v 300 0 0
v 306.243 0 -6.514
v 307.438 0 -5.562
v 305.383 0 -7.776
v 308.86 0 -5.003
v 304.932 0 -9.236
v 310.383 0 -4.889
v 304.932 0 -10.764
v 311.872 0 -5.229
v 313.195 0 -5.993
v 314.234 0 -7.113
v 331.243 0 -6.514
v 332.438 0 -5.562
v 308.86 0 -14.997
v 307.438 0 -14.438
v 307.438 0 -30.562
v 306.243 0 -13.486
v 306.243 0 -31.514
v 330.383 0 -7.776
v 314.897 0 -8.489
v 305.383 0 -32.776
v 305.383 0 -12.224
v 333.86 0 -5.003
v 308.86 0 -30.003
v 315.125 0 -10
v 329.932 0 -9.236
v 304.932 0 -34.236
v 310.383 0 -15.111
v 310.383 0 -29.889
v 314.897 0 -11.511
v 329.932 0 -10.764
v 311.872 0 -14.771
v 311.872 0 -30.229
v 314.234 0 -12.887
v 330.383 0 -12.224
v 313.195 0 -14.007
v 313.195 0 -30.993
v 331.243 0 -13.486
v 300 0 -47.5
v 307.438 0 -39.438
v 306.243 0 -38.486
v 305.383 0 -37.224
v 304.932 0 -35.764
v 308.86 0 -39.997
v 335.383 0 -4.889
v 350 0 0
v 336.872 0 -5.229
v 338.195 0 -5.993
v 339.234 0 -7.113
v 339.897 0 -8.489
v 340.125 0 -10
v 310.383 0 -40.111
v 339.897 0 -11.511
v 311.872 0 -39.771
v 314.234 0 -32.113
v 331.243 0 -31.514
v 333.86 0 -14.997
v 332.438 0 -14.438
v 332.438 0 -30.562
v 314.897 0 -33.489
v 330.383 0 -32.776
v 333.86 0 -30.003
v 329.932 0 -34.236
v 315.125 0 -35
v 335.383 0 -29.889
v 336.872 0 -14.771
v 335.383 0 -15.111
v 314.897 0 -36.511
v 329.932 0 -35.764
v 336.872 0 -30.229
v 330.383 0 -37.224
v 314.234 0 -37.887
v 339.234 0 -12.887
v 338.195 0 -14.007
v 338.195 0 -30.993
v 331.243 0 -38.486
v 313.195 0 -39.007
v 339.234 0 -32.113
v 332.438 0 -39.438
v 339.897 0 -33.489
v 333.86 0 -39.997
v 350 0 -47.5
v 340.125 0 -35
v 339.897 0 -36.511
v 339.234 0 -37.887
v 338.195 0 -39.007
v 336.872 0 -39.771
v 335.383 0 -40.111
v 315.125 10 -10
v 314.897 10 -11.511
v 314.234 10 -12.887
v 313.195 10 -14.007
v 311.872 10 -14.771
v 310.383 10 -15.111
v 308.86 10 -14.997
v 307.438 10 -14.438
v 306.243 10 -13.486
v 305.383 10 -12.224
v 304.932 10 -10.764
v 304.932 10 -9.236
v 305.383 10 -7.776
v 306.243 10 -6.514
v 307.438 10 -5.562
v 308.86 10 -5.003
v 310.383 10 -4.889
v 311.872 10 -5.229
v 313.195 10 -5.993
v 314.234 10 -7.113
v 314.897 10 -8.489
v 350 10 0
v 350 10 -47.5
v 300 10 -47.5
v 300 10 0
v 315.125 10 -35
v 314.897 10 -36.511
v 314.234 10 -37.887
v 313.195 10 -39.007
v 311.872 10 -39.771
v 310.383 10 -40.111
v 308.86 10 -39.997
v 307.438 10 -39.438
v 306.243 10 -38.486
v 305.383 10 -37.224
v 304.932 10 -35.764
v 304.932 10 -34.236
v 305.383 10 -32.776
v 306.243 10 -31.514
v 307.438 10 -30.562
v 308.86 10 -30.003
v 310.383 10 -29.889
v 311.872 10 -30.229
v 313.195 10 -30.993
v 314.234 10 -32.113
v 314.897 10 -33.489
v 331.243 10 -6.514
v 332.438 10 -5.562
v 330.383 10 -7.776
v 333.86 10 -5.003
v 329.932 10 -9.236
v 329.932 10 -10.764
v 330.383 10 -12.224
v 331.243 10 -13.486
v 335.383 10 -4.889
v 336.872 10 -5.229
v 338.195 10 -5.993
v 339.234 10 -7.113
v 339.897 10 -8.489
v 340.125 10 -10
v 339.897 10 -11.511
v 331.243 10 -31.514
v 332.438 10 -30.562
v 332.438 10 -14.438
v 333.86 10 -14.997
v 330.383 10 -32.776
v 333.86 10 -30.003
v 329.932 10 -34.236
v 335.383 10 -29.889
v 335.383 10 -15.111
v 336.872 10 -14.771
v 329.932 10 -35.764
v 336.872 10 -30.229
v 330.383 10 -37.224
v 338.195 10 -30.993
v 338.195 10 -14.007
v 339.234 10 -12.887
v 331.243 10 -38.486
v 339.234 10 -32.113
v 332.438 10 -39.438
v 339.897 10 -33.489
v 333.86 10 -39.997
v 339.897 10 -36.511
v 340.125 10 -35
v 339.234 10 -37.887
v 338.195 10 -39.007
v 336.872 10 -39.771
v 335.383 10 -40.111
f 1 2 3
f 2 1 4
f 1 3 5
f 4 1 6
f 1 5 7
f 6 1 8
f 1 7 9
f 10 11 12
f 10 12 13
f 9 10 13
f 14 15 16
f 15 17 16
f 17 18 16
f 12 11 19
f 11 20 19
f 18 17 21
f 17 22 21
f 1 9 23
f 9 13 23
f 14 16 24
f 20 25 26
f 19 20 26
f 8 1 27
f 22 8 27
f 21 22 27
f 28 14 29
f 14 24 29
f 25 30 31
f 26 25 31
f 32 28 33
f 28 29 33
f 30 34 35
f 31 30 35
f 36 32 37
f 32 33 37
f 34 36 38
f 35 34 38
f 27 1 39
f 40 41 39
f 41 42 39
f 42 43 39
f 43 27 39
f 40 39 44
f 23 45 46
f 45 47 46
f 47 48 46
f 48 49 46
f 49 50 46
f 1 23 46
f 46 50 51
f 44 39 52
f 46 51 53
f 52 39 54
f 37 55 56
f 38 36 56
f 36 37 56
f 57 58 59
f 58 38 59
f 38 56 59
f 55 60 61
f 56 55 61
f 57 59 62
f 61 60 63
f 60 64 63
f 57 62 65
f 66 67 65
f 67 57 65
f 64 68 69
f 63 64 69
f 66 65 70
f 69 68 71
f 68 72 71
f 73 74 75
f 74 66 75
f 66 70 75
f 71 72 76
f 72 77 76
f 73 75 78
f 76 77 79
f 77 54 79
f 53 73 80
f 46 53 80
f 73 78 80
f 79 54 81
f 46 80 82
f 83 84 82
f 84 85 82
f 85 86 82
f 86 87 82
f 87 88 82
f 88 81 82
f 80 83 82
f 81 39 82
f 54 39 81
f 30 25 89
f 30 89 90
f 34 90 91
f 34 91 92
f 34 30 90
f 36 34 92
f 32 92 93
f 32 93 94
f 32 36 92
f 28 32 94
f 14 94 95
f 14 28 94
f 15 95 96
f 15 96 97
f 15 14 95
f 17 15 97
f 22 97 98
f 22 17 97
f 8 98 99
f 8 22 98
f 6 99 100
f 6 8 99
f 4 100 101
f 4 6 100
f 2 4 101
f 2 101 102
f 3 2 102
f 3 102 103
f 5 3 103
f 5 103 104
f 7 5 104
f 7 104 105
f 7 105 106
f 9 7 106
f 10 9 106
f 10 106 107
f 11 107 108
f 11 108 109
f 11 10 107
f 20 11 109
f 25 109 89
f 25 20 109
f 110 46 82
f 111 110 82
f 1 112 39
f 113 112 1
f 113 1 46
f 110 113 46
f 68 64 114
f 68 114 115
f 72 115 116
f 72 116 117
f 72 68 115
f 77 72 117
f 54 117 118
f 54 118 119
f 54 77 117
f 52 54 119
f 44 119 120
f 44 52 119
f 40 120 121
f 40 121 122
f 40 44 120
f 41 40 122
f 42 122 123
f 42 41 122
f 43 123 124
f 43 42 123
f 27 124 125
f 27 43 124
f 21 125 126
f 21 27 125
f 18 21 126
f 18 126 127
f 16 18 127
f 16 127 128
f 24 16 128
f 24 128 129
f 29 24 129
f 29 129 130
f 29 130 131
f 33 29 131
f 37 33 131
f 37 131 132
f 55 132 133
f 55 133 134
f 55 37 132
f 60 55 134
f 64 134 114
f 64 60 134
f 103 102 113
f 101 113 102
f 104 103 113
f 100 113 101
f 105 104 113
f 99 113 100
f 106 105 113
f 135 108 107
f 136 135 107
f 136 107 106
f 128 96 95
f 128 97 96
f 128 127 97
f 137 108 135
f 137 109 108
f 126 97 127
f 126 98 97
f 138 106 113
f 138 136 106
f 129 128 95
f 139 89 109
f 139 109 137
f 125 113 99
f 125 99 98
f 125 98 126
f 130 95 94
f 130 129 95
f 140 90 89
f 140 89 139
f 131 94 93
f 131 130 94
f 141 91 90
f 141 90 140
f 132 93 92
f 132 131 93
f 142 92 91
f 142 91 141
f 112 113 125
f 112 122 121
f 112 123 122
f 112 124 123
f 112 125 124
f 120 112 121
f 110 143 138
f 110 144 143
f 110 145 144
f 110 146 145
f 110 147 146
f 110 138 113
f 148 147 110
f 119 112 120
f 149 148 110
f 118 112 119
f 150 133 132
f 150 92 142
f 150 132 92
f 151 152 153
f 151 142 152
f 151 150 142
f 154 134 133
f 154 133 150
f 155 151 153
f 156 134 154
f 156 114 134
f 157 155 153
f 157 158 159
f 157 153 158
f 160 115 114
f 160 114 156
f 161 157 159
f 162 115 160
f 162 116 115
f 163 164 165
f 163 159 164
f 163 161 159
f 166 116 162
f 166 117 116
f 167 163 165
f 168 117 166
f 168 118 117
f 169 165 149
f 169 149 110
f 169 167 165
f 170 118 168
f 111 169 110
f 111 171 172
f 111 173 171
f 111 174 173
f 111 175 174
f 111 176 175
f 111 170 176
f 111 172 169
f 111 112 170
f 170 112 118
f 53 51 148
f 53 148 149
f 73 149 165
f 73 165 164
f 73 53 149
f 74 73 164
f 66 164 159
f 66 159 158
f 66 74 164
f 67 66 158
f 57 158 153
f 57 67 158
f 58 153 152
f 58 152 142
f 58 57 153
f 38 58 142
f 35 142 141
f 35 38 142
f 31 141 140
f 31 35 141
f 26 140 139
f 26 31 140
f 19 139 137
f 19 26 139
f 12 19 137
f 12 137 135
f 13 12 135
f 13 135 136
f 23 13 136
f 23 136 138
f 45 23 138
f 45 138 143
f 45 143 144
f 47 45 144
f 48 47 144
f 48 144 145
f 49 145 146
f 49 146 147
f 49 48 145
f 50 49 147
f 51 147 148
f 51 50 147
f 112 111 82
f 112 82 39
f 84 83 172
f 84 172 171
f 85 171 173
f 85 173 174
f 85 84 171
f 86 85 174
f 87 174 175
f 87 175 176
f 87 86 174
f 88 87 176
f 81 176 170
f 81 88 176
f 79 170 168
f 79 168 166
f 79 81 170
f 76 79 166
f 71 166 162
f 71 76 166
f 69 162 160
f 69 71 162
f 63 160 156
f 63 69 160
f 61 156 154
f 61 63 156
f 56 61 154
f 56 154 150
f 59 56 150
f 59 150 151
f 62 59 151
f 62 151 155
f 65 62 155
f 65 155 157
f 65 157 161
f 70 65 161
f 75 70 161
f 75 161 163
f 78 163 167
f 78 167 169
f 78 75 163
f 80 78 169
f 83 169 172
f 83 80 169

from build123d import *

# Parameters (mm, degrees)
SKETCH2_W               = 350
SKETCH2_H               = 350
BOSS_EXTRUDE2_DEPTH     = 10
ADVANCEDHOLE1_OUTLINE_R = 5.125
ADVANCEDHOLE1_DEPTH     = 10
CUT_EXTRUDE4_DEPTH      = 50
CUT_EXTRUDE5_DEPTH      = 50


# Read off the part's stored shape, not the designer's step: AdvancedHole1
with BuildPart() as part:
    # Sketch2 → Boss-Extrude2 (new body)
    with BuildSketch(Plane(origin=(0, 0, 0), x_dir=(1, 0, 0), z_dir=(0, 1, 0))):
        with Locations((175, 175)):
            Rectangle(SKETCH2_W, SKETCH2_H)
    extrude(amount=BOSS_EXTRUDE2_DEPTH)

    # AdvancedHole1 outline → AdvancedHole1 (cut)
    with BuildSketch(Plane(origin=(0, 0, 0), x_dir=(1, 0, 0), z_dir=(0, 1, 0))):
        with Locations((10, 310)):
            Circle(ADVANCEDHOLE1_OUTLINE_R)
        with Locations((10, 335)):
            Circle(ADVANCEDHOLE1_OUTLINE_R)
        with Locations((35, 335)):
            Circle(ADVANCEDHOLE1_OUTLINE_R)
        with Locations((35, 310)):
            Circle(ADVANCEDHOLE1_OUTLINE_R)
        with Locations((60, 335)):
            Circle(ADVANCEDHOLE1_OUTLINE_R)
        with Locations((85, 335)):
            Circle(ADVANCEDHOLE1_OUTLINE_R)
        with Locations((60, 310)):
            Circle(ADVANCEDHOLE1_OUTLINE_R)
        with Locations((85, 310)):
            Circle(ADVANCEDHOLE1_OUTLINE_R)
        with Locations((10, 285)):
            Circle(ADVANCEDHOLE1_OUTLINE_R)
        with Locations((35, 285)):
            Circle(ADVANCEDHOLE1_OUTLINE_R)
        with Locations((60, 285)):
            Circle(ADVANCEDHOLE1_OUTLINE_R)
        with Locations((85, 285)):
            Circle(ADVANCEDHOLE1_OUTLINE_R)
        with Locations((10, 260)):
            Circle(ADVANCEDHOLE1_OUTLINE_R)
        with Locations((35, 260)):
            Circle(ADVANCEDHOLE1_OUTLINE_R)
        with Locations((60, 260)):
            Circle(ADVANCEDHOLE1_OUTLINE_R)
        with Locations((85, 260)):
            Circle(ADVANCEDHOLE1_OUTLINE_R)
        with Locations((110, 285)):
            Circle(ADVANCEDHOLE1_OUTLINE_R)
        with Locations((110, 310)):
            Circle(ADVANCEDHOLE1_OUTLINE_R)
        with Locations((110, 335)):
            Circle(ADVANCEDHOLE1_OUTLINE_R)
        with Locations((135, 285)):
            Circle(ADVANCEDHOLE1_OUTLINE_R)
        with Locations((135, 310)):
            Circle(ADVANCEDHOLE1_OUTLINE_R)
        with Locations((135, 335)):
            Circle(ADVANCEDHOLE1_OUTLINE_R)
        with Locations((160, 335)):
            Circle(ADVANCEDHOLE1_OUTLINE_R)
        with Locations((160, 310)):
            Circle(ADVANCEDHOLE1_OUTLINE_R)
        with Locations((110, 260)):
            Circle(ADVANCEDHOLE1_OUTLINE_R)
        with Locations((135, 260)):
            Circle(ADVANCEDHOLE1_OUTLINE_R)
        with Locations((160, 285)):
            Circle(ADVANCEDHOLE1_OUTLINE_R)
        with Locations((160, 260)):
            Circle(ADVANCEDHOLE1_OUTLINE_R)
        with Locations((185, 335)):
            Circle(ADVANCEDHOLE1_OUTLINE_R)
        with Locations((185, 310)):
            Circle(ADVANCEDHOLE1_OUTLINE_R)
        with Locations((185, 285)):
            Circle(ADVANCEDHOLE1_OUTLINE_R)
        with Locations((185, 260)):
            Circle(ADVANCEDHOLE1_OUTLINE_R)
        with Locations((210, 310)):
            Circle(ADVANCEDHOLE1_OUTLINE_R)
        with Locations((210, 335)):
            Circle(ADVANCEDHOLE1_OUTLINE_R)
        with Locations((235, 310)):
            Circle(ADVANCEDHOLE1_OUTLINE_R)
        with Locations((235, 335)):
            Circle(ADVANCEDHOLE1_OUTLINE_R)
        with Locations((260, 310)):
            Circle(ADVANCEDHOLE1_OUTLINE_R)
        with Locations((285, 310)):
            Circle(ADVANCEDHOLE1_OUTLINE_R)
        with Locations((260, 335)):
            Circle(ADVANCEDHOLE1_OUTLINE_R)
        with Locations((285, 335)):
            Circle(ADVANCEDHOLE1_OUTLINE_R)
        with Locations((310, 335)):
            Circle(ADVANCEDHOLE1_OUTLINE_R)
        with Locations((335, 335)):
            Circle(ADVANCEDHOLE1_OUTLINE_R)
        with Locations((310, 310)):
            Circle(ADVANCEDHOLE1_OUTLINE_R)
        with Locations((335, 310)):
            Circle(ADVANCEDHOLE1_OUTLINE_R)
        with Locations((210, 285)):
            Circle(ADVANCEDHOLE1_OUTLINE_R)
        with Locations((235, 285)):
            Circle(ADVANCEDHOLE1_OUTLINE_R)
        with Locations((260, 285)):
            Circle(ADVANCEDHOLE1_OUTLINE_R)
        with Locations((285, 285)):
            Circle(ADVANCEDHOLE1_OUTLINE_R)
        with Locations((310, 285)):
            Circle(ADVANCEDHOLE1_OUTLINE_R)
        with Locations((335, 285)):
            Circle(ADVANCEDHOLE1_OUTLINE_R)
        with Locations((210, 260)):
            Circle(ADVANCEDHOLE1_OUTLINE_R)
        with Locations((235, 260)):
            Circle(ADVANCEDHOLE1_OUTLINE_R)
        with Locations((260, 260)):
            Circle(ADVANCEDHOLE1_OUTLINE_R)
        with Locations((285, 260)):
            Circle(ADVANCEDHOLE1_OUTLINE_R)
        with Locations((310, 260)):
            Circle(ADVANCEDHOLE1_OUTLINE_R)
        with Locations((335, 260)):
            Circle(ADVANCEDHOLE1_OUTLINE_R)
        with Locations((10, 235)):
            Circle(ADVANCEDHOLE1_OUTLINE_R)
        with Locations((35, 235)):
            Circle(ADVANCEDHOLE1_OUTLINE_R)
        with Locations((60, 235)):
            Circle(ADVANCEDHOLE1_OUTLINE_R)
        with Locations((85, 235)):
            Circle(ADVANCEDHOLE1_OUTLINE_R)
        with Locations((110, 235)):
            Circle(ADVANCEDHOLE1_OUTLINE_R)
        with Locations((135, 235)):
            Circle(ADVANCEDHOLE1_OUTLINE_R)
        with Locations((160, 235)):
            Circle(ADVANCEDHOLE1_OUTLINE_R)
        with Locations((185, 235)):
            Circle(ADVANCEDHOLE1_OUTLINE_R)
        with Locations((210, 235)):
            Circle(ADVANCEDHOLE1_OUTLINE_R)
        with Locations((235, 235)):
            Circle(ADVANCEDHOLE1_OUTLINE_R)
        with Locations((260, 235)):
            Circle(ADVANCEDHOLE1_OUTLINE_R)
        with Locations((285, 235)):
            Circle(ADVANCEDHOLE1_OUTLINE_R)
        with Locations((310, 235)):
            Circle(ADVANCEDHOLE1_OUTLINE_R)
        with Locations((335, 235)):
            Circle(ADVANCEDHOLE1_OUTLINE_R)
        with Locations((10, 210)):
            Circle(ADVANCEDHOLE1_OUTLINE_R)
        with Locations((35, 210)):
            Circle(ADVANCEDHOLE1_OUTLINE_R)
        with Locations((60, 210)):
            Circle(ADVANCEDHOLE1_OUTLINE_R)
        with Locations((85, 210)):
            Circle(ADVANCEDHOLE1_OUTLINE_R)
        with Locations((110, 210)):
            Circle(ADVANCEDHOLE1_OUTLINE_R)
        with Locations((135, 210)):
            Circle(ADVANCEDHOLE1_OUTLINE_R)
        with Locations((160, 210)):
            Circle(ADVANCEDHOLE1_OUTLINE_R)
        with Locations((185, 210)):
            Circle(ADVANCEDHOLE1_OUTLINE_R)
        with Locations((210, 210)):
            Circle(ADVANCEDHOLE1_OUTLINE_R)
        with Locations((235, 210)):
            Circle(ADVANCEDHOLE1_OUTLINE_R)
        with Locations((260, 210)):
            Circle(ADVANCEDHOLE1_OUTLINE_R)
        with Locations((285, 210)):
            Circle(ADVANCEDHOLE1_OUTLINE_R)
        with Locations((310, 210)):
            Circle(ADVANCEDHOLE1_OUTLINE_R)
        with Locations((335, 210)):
            Circle(ADVANCEDHOLE1_OUTLINE_R)
        with Locations((10, 185)):
            Circle(ADVANCEDHOLE1_OUTLINE_R)
        with Locations((35, 185)):
            Circle(ADVANCEDHOLE1_OUTLINE_R)
        with Locations((60, 185)):
            Circle(ADVANCEDHOLE1_OUTLINE_R)
        with Locations((85, 185)):
            Circle(ADVANCEDHOLE1_OUTLINE_R)
        with Locations((110, 185)):
            Circle(ADVANCEDHOLE1_OUTLINE_R)
        with Locations((135, 185)):
            Circle(ADVANCEDHOLE1_OUTLINE_R)
        with Locations((160, 185)):
            Circle(ADVANCEDHOLE1_OUTLINE_R)
        with Locations((185, 185)):
            Circle(ADVANCEDHOLE1_OUTLINE_R)
        with Locations((210, 185)):
            Circle(ADVANCEDHOLE1_OUTLINE_R)
        with Locations((235, 185)):
            Circle(ADVANCEDHOLE1_OUTLINE_R)
        with Locations((260, 185)):
            Circle(ADVANCEDHOLE1_OUTLINE_R)
        with Locations((285, 185)):
            Circle(ADVANCEDHOLE1_OUTLINE_R)
        with Locations((310, 185)):
            Circle(ADVANCEDHOLE1_OUTLINE_R)
        with Locations((335, 185)):
            Circle(ADVANCEDHOLE1_OUTLINE_R)
        with Locations((10, 160)):
            Circle(ADVANCEDHOLE1_OUTLINE_R)
        with Locations((35, 160)):
            Circle(ADVANCEDHOLE1_OUTLINE_R)
        with Locations((60, 160)):
            Circle(ADVANCEDHOLE1_OUTLINE_R)
        with Locations((85, 160)):
            Circle(ADVANCEDHOLE1_OUTLINE_R)
        with Locations((110, 160)):
            Circle(ADVANCEDHOLE1_OUTLINE_R)
        with Locations((135, 160)):
            Circle(ADVANCEDHOLE1_OUTLINE_R)
        with Locations((160, 160)):
            Circle(ADVANCEDHOLE1_OUTLINE_R)
        with Locations((185, 160)):
            Circle(ADVANCEDHOLE1_OUTLINE_R)
        with Locations((210, 160)):
            Circle(ADVANCEDHOLE1_OUTLINE_R)
        with Locations((235, 160)):
            Circle(ADVANCEDHOLE1_OUTLINE_R)
        with Locations((260, 160)):
            Circle(ADVANCEDHOLE1_OUTLINE_R)
        with Locations((285, 160)):
            Circle(ADVANCEDHOLE1_OUTLINE_R)
        with Locations((310, 160)):
            Circle(ADVANCEDHOLE1_OUTLINE_R)
        with Locations((335, 160)):
            Circle(ADVANCEDHOLE1_OUTLINE_R)
        with Locations((10, 135)):
            Circle(ADVANCEDHOLE1_OUTLINE_R)
        with Locations((35, 135)):
            Circle(ADVANCEDHOLE1_OUTLINE_R)
        with Locations((60, 135)):
            Circle(ADVANCEDHOLE1_OUTLINE_R)
        with Locations((85, 135)):
            Circle(ADVANCEDHOLE1_OUTLINE_R)
        with Locations((110, 135)):
            Circle(ADVANCEDHOLE1_OUTLINE_R)
        with Locations((135, 135)):
            Circle(ADVANCEDHOLE1_OUTLINE_R)
        with Locations((160, 135)):
            Circle(ADVANCEDHOLE1_OUTLINE_R)
        with Locations((185, 135)):
            Circle(ADVANCEDHOLE1_OUTLINE_R)
        with Locations((210, 135)):
            Circle(ADVANCEDHOLE1_OUTLINE_R)
        with Locations((235, 135)):
            Circle(ADVANCEDHOLE1_OUTLINE_R)
        with Locations((260, 135)):
            Circle(ADVANCEDHOLE1_OUTLINE_R)
        with Locations((285, 135)):
            Circle(ADVANCEDHOLE1_OUTLINE_R)
        with Locations((310, 135)):
            Circle(ADVANCEDHOLE1_OUTLINE_R)
        with Locations((335, 135)):
            Circle(ADVANCEDHOLE1_OUTLINE_R)
        with Locations((10, 110)):
            Circle(ADVANCEDHOLE1_OUTLINE_R)
        with Locations((35, 110)):
            Circle(ADVANCEDHOLE1_OUTLINE_R)
        with Locations((60, 110)):
            Circle(ADVANCEDHOLE1_OUTLINE_R)
        with Locations((85, 110)):
            Circle(ADVANCEDHOLE1_OUTLINE_R)
        with Locations((110, 110)):
            Circle(ADVANCEDHOLE1_OUTLINE_R)
        with Locations((135, 110)):
            Circle(ADVANCEDHOLE1_OUTLINE_R)
        with Locations((160, 110)):
            Circle(ADVANCEDHOLE1_OUTLINE_R)
        with Locations((185, 110)):
            Circle(ADVANCEDHOLE1_OUTLINE_R)
        with Locations((210, 110)):
            Circle(ADVANCEDHOLE1_OUTLINE_R)
        with Locations((235, 110)):
            Circle(ADVANCEDHOLE1_OUTLINE_R)
        with Locations((260, 110)):
            Circle(ADVANCEDHOLE1_OUTLINE_R)
        with Locations((285, 110)):
            Circle(ADVANCEDHOLE1_OUTLINE_R)
        with Locations((310, 110)):
            Circle(ADVANCEDHOLE1_OUTLINE_R)
        with Locations((335, 110)):
            Circle(ADVANCEDHOLE1_OUTLINE_R)
        with Locations((10, 85)):
            Circle(ADVANCEDHOLE1_OUTLINE_R)
        with Locations((35, 85)):
            Circle(ADVANCEDHOLE1_OUTLINE_R)
        with Locations((60, 85)):
            Circle(ADVANCEDHOLE1_OUTLINE_R)
        with Locations((85, 85)):
            Circle(ADVANCEDHOLE1_OUTLINE_R)
        with Locations((110, 85)):
            Circle(ADVANCEDHOLE1_OUTLINE_R)
        with Locations((135, 85)):
            Circle(ADVANCEDHOLE1_OUTLINE_R)
        with Locations((160, 85)):
            Circle(ADVANCEDHOLE1_OUTLINE_R)
        with Locations((185, 85)):
            Circle(ADVANCEDHOLE1_OUTLINE_R)
        with Locations((210, 85)):
            Circle(ADVANCEDHOLE1_OUTLINE_R)
        with Locations((235, 85)):
            Circle(ADVANCEDHOLE1_OUTLINE_R)
        with Locations((260, 85)):
            Circle(ADVANCEDHOLE1_OUTLINE_R)
        with Locations((285, 85)):
            Circle(ADVANCEDHOLE1_OUTLINE_R)
        with Locations((310, 85)):
            Circle(ADVANCEDHOLE1_OUTLINE_R)
        with Locations((335, 85)):
            Circle(ADVANCEDHOLE1_OUTLINE_R)
        with Locations((335, 60)):
            Circle(ADVANCEDHOLE1_OUTLINE_R)
        with Locations((310, 60)):
            Circle(ADVANCEDHOLE1_OUTLINE_R)
        with Locations((285, 60)):
            Circle(ADVANCEDHOLE1_OUTLINE_R)
        with Locations((260, 60)):
            Circle(ADVANCEDHOLE1_OUTLINE_R)
        with Locations((235, 60)):
            Circle(ADVANCEDHOLE1_OUTLINE_R)
        with Locations((210, 60)):
            Circle(ADVANCEDHOLE1_OUTLINE_R)
        with Locations((185, 60)):
            Circle(ADVANCEDHOLE1_OUTLINE_R)
        with Locations((160, 60)):
            Circle(ADVANCEDHOLE1_OUTLINE_R)
        with Locations((135, 60)):
            Circle(ADVANCEDHOLE1_OUTLINE_R)
        with Locations((110, 60)):
            Circle(ADVANCEDHOLE1_OUTLINE_R)
        with Locations((85, 60)):
            Circle(ADVANCEDHOLE1_OUTLINE_R)
        with Locations((60, 60)):
            Circle(ADVANCEDHOLE1_OUTLINE_R)
        with Locations((35, 60)):
            Circle(ADVANCEDHOLE1_OUTLINE_R)
        with Locations((10, 60)):
            Circle(ADVANCEDHOLE1_OUTLINE_R)
        with Locations((10, 35)):
            Circle(ADVANCEDHOLE1_OUTLINE_R)
        with Locations((35, 35)):
            Circle(ADVANCEDHOLE1_OUTLINE_R)
        with Locations((60, 35)):
            Circle(ADVANCEDHOLE1_OUTLINE_R)
        with Locations((85, 35)):
            Circle(ADVANCEDHOLE1_OUTLINE_R)
        with Locations((110, 35)):
            Circle(ADVANCEDHOLE1_OUTLINE_R)
        with Locations((135, 35)):
            Circle(ADVANCEDHOLE1_OUTLINE_R)
        with Locations((160, 35)):
            Circle(ADVANCEDHOLE1_OUTLINE_R)
        with Locations((185, 35)):
            Circle(ADVANCEDHOLE1_OUTLINE_R)
        with Locations((210, 35)):
            Circle(ADVANCEDHOLE1_OUTLINE_R)
        with Locations((235, 35)):
            Circle(ADVANCEDHOLE1_OUTLINE_R)
        with Locations((260, 35)):
            Circle(ADVANCEDHOLE1_OUTLINE_R)
        with Locations((285, 35)):
            Circle(ADVANCEDHOLE1_OUTLINE_R)
        with Locations((310, 35)):
            Circle(ADVANCEDHOLE1_OUTLINE_R)
        with Locations((335, 35)):
            Circle(ADVANCEDHOLE1_OUTLINE_R)
        with Locations((10, 10)):
            Circle(ADVANCEDHOLE1_OUTLINE_R)
        with Locations((35, 10)):
            Circle(ADVANCEDHOLE1_OUTLINE_R)
        with Locations((60, 10)):
            Circle(ADVANCEDHOLE1_OUTLINE_R)
        with Locations((85, 10)):
            Circle(ADVANCEDHOLE1_OUTLINE_R)
        with Locations((110, 10)):
            Circle(ADVANCEDHOLE1_OUTLINE_R)
        with Locations((135, 10)):
            Circle(ADVANCEDHOLE1_OUTLINE_R)
        with Locations((160, 10)):
            Circle(ADVANCEDHOLE1_OUTLINE_R)
        with Locations((185, 10)):
            Circle(ADVANCEDHOLE1_OUTLINE_R)
        with Locations((210, 10)):
            Circle(ADVANCEDHOLE1_OUTLINE_R)
        with Locations((235, 10)):
            Circle(ADVANCEDHOLE1_OUTLINE_R)
        with Locations((260, 10)):
            Circle(ADVANCEDHOLE1_OUTLINE_R)
        with Locations((285, 10)):
            Circle(ADVANCEDHOLE1_OUTLINE_R)
        with Locations((310, 10)):
            Circle(ADVANCEDHOLE1_OUTLINE_R)
        with Locations((335, 10)):
            Circle(ADVANCEDHOLE1_OUTLINE_R)
    extrude(amount=ADVANCEDHOLE1_DEPTH, mode=Mode.SUBTRACT)

    # 3DSketch14 → Cut-Extrude4 (cut)
    with BuildSketch(Plane(origin=(350, 30, -47.5), x_dir=(-0.7565799289349062, 0, -0.6539012242937402), z_dir=(0, 1, 0))):
        Polygon((0, 0), (264.802975127, 228.865428503), (462.608095476, 0), (197.805120349, -228.865428503), align=None)
    extrude(amount=-CUT_EXTRUDE4_DEPTH, mode=Mode.SUBTRACT)

    # 3DSketch15 → Cut-Extrude5 (cut)
    with BuildSketch(Plane(origin=(300, 50, 0), x_dir=(-0.9876961386749972, 1.8714675105968527e-13, -0.15638522195687465), z_dir=(0, -1, 0))):
        Polygon((0, 0), (296.308841602, -46.915566587), (303.737139645, 0), (7.428298043, 46.915566587), align=None)
    extrude(amount=CUT_EXTRUDE5_DEPTH, mode=Mode.SUBTRACT)


solid = part.part
